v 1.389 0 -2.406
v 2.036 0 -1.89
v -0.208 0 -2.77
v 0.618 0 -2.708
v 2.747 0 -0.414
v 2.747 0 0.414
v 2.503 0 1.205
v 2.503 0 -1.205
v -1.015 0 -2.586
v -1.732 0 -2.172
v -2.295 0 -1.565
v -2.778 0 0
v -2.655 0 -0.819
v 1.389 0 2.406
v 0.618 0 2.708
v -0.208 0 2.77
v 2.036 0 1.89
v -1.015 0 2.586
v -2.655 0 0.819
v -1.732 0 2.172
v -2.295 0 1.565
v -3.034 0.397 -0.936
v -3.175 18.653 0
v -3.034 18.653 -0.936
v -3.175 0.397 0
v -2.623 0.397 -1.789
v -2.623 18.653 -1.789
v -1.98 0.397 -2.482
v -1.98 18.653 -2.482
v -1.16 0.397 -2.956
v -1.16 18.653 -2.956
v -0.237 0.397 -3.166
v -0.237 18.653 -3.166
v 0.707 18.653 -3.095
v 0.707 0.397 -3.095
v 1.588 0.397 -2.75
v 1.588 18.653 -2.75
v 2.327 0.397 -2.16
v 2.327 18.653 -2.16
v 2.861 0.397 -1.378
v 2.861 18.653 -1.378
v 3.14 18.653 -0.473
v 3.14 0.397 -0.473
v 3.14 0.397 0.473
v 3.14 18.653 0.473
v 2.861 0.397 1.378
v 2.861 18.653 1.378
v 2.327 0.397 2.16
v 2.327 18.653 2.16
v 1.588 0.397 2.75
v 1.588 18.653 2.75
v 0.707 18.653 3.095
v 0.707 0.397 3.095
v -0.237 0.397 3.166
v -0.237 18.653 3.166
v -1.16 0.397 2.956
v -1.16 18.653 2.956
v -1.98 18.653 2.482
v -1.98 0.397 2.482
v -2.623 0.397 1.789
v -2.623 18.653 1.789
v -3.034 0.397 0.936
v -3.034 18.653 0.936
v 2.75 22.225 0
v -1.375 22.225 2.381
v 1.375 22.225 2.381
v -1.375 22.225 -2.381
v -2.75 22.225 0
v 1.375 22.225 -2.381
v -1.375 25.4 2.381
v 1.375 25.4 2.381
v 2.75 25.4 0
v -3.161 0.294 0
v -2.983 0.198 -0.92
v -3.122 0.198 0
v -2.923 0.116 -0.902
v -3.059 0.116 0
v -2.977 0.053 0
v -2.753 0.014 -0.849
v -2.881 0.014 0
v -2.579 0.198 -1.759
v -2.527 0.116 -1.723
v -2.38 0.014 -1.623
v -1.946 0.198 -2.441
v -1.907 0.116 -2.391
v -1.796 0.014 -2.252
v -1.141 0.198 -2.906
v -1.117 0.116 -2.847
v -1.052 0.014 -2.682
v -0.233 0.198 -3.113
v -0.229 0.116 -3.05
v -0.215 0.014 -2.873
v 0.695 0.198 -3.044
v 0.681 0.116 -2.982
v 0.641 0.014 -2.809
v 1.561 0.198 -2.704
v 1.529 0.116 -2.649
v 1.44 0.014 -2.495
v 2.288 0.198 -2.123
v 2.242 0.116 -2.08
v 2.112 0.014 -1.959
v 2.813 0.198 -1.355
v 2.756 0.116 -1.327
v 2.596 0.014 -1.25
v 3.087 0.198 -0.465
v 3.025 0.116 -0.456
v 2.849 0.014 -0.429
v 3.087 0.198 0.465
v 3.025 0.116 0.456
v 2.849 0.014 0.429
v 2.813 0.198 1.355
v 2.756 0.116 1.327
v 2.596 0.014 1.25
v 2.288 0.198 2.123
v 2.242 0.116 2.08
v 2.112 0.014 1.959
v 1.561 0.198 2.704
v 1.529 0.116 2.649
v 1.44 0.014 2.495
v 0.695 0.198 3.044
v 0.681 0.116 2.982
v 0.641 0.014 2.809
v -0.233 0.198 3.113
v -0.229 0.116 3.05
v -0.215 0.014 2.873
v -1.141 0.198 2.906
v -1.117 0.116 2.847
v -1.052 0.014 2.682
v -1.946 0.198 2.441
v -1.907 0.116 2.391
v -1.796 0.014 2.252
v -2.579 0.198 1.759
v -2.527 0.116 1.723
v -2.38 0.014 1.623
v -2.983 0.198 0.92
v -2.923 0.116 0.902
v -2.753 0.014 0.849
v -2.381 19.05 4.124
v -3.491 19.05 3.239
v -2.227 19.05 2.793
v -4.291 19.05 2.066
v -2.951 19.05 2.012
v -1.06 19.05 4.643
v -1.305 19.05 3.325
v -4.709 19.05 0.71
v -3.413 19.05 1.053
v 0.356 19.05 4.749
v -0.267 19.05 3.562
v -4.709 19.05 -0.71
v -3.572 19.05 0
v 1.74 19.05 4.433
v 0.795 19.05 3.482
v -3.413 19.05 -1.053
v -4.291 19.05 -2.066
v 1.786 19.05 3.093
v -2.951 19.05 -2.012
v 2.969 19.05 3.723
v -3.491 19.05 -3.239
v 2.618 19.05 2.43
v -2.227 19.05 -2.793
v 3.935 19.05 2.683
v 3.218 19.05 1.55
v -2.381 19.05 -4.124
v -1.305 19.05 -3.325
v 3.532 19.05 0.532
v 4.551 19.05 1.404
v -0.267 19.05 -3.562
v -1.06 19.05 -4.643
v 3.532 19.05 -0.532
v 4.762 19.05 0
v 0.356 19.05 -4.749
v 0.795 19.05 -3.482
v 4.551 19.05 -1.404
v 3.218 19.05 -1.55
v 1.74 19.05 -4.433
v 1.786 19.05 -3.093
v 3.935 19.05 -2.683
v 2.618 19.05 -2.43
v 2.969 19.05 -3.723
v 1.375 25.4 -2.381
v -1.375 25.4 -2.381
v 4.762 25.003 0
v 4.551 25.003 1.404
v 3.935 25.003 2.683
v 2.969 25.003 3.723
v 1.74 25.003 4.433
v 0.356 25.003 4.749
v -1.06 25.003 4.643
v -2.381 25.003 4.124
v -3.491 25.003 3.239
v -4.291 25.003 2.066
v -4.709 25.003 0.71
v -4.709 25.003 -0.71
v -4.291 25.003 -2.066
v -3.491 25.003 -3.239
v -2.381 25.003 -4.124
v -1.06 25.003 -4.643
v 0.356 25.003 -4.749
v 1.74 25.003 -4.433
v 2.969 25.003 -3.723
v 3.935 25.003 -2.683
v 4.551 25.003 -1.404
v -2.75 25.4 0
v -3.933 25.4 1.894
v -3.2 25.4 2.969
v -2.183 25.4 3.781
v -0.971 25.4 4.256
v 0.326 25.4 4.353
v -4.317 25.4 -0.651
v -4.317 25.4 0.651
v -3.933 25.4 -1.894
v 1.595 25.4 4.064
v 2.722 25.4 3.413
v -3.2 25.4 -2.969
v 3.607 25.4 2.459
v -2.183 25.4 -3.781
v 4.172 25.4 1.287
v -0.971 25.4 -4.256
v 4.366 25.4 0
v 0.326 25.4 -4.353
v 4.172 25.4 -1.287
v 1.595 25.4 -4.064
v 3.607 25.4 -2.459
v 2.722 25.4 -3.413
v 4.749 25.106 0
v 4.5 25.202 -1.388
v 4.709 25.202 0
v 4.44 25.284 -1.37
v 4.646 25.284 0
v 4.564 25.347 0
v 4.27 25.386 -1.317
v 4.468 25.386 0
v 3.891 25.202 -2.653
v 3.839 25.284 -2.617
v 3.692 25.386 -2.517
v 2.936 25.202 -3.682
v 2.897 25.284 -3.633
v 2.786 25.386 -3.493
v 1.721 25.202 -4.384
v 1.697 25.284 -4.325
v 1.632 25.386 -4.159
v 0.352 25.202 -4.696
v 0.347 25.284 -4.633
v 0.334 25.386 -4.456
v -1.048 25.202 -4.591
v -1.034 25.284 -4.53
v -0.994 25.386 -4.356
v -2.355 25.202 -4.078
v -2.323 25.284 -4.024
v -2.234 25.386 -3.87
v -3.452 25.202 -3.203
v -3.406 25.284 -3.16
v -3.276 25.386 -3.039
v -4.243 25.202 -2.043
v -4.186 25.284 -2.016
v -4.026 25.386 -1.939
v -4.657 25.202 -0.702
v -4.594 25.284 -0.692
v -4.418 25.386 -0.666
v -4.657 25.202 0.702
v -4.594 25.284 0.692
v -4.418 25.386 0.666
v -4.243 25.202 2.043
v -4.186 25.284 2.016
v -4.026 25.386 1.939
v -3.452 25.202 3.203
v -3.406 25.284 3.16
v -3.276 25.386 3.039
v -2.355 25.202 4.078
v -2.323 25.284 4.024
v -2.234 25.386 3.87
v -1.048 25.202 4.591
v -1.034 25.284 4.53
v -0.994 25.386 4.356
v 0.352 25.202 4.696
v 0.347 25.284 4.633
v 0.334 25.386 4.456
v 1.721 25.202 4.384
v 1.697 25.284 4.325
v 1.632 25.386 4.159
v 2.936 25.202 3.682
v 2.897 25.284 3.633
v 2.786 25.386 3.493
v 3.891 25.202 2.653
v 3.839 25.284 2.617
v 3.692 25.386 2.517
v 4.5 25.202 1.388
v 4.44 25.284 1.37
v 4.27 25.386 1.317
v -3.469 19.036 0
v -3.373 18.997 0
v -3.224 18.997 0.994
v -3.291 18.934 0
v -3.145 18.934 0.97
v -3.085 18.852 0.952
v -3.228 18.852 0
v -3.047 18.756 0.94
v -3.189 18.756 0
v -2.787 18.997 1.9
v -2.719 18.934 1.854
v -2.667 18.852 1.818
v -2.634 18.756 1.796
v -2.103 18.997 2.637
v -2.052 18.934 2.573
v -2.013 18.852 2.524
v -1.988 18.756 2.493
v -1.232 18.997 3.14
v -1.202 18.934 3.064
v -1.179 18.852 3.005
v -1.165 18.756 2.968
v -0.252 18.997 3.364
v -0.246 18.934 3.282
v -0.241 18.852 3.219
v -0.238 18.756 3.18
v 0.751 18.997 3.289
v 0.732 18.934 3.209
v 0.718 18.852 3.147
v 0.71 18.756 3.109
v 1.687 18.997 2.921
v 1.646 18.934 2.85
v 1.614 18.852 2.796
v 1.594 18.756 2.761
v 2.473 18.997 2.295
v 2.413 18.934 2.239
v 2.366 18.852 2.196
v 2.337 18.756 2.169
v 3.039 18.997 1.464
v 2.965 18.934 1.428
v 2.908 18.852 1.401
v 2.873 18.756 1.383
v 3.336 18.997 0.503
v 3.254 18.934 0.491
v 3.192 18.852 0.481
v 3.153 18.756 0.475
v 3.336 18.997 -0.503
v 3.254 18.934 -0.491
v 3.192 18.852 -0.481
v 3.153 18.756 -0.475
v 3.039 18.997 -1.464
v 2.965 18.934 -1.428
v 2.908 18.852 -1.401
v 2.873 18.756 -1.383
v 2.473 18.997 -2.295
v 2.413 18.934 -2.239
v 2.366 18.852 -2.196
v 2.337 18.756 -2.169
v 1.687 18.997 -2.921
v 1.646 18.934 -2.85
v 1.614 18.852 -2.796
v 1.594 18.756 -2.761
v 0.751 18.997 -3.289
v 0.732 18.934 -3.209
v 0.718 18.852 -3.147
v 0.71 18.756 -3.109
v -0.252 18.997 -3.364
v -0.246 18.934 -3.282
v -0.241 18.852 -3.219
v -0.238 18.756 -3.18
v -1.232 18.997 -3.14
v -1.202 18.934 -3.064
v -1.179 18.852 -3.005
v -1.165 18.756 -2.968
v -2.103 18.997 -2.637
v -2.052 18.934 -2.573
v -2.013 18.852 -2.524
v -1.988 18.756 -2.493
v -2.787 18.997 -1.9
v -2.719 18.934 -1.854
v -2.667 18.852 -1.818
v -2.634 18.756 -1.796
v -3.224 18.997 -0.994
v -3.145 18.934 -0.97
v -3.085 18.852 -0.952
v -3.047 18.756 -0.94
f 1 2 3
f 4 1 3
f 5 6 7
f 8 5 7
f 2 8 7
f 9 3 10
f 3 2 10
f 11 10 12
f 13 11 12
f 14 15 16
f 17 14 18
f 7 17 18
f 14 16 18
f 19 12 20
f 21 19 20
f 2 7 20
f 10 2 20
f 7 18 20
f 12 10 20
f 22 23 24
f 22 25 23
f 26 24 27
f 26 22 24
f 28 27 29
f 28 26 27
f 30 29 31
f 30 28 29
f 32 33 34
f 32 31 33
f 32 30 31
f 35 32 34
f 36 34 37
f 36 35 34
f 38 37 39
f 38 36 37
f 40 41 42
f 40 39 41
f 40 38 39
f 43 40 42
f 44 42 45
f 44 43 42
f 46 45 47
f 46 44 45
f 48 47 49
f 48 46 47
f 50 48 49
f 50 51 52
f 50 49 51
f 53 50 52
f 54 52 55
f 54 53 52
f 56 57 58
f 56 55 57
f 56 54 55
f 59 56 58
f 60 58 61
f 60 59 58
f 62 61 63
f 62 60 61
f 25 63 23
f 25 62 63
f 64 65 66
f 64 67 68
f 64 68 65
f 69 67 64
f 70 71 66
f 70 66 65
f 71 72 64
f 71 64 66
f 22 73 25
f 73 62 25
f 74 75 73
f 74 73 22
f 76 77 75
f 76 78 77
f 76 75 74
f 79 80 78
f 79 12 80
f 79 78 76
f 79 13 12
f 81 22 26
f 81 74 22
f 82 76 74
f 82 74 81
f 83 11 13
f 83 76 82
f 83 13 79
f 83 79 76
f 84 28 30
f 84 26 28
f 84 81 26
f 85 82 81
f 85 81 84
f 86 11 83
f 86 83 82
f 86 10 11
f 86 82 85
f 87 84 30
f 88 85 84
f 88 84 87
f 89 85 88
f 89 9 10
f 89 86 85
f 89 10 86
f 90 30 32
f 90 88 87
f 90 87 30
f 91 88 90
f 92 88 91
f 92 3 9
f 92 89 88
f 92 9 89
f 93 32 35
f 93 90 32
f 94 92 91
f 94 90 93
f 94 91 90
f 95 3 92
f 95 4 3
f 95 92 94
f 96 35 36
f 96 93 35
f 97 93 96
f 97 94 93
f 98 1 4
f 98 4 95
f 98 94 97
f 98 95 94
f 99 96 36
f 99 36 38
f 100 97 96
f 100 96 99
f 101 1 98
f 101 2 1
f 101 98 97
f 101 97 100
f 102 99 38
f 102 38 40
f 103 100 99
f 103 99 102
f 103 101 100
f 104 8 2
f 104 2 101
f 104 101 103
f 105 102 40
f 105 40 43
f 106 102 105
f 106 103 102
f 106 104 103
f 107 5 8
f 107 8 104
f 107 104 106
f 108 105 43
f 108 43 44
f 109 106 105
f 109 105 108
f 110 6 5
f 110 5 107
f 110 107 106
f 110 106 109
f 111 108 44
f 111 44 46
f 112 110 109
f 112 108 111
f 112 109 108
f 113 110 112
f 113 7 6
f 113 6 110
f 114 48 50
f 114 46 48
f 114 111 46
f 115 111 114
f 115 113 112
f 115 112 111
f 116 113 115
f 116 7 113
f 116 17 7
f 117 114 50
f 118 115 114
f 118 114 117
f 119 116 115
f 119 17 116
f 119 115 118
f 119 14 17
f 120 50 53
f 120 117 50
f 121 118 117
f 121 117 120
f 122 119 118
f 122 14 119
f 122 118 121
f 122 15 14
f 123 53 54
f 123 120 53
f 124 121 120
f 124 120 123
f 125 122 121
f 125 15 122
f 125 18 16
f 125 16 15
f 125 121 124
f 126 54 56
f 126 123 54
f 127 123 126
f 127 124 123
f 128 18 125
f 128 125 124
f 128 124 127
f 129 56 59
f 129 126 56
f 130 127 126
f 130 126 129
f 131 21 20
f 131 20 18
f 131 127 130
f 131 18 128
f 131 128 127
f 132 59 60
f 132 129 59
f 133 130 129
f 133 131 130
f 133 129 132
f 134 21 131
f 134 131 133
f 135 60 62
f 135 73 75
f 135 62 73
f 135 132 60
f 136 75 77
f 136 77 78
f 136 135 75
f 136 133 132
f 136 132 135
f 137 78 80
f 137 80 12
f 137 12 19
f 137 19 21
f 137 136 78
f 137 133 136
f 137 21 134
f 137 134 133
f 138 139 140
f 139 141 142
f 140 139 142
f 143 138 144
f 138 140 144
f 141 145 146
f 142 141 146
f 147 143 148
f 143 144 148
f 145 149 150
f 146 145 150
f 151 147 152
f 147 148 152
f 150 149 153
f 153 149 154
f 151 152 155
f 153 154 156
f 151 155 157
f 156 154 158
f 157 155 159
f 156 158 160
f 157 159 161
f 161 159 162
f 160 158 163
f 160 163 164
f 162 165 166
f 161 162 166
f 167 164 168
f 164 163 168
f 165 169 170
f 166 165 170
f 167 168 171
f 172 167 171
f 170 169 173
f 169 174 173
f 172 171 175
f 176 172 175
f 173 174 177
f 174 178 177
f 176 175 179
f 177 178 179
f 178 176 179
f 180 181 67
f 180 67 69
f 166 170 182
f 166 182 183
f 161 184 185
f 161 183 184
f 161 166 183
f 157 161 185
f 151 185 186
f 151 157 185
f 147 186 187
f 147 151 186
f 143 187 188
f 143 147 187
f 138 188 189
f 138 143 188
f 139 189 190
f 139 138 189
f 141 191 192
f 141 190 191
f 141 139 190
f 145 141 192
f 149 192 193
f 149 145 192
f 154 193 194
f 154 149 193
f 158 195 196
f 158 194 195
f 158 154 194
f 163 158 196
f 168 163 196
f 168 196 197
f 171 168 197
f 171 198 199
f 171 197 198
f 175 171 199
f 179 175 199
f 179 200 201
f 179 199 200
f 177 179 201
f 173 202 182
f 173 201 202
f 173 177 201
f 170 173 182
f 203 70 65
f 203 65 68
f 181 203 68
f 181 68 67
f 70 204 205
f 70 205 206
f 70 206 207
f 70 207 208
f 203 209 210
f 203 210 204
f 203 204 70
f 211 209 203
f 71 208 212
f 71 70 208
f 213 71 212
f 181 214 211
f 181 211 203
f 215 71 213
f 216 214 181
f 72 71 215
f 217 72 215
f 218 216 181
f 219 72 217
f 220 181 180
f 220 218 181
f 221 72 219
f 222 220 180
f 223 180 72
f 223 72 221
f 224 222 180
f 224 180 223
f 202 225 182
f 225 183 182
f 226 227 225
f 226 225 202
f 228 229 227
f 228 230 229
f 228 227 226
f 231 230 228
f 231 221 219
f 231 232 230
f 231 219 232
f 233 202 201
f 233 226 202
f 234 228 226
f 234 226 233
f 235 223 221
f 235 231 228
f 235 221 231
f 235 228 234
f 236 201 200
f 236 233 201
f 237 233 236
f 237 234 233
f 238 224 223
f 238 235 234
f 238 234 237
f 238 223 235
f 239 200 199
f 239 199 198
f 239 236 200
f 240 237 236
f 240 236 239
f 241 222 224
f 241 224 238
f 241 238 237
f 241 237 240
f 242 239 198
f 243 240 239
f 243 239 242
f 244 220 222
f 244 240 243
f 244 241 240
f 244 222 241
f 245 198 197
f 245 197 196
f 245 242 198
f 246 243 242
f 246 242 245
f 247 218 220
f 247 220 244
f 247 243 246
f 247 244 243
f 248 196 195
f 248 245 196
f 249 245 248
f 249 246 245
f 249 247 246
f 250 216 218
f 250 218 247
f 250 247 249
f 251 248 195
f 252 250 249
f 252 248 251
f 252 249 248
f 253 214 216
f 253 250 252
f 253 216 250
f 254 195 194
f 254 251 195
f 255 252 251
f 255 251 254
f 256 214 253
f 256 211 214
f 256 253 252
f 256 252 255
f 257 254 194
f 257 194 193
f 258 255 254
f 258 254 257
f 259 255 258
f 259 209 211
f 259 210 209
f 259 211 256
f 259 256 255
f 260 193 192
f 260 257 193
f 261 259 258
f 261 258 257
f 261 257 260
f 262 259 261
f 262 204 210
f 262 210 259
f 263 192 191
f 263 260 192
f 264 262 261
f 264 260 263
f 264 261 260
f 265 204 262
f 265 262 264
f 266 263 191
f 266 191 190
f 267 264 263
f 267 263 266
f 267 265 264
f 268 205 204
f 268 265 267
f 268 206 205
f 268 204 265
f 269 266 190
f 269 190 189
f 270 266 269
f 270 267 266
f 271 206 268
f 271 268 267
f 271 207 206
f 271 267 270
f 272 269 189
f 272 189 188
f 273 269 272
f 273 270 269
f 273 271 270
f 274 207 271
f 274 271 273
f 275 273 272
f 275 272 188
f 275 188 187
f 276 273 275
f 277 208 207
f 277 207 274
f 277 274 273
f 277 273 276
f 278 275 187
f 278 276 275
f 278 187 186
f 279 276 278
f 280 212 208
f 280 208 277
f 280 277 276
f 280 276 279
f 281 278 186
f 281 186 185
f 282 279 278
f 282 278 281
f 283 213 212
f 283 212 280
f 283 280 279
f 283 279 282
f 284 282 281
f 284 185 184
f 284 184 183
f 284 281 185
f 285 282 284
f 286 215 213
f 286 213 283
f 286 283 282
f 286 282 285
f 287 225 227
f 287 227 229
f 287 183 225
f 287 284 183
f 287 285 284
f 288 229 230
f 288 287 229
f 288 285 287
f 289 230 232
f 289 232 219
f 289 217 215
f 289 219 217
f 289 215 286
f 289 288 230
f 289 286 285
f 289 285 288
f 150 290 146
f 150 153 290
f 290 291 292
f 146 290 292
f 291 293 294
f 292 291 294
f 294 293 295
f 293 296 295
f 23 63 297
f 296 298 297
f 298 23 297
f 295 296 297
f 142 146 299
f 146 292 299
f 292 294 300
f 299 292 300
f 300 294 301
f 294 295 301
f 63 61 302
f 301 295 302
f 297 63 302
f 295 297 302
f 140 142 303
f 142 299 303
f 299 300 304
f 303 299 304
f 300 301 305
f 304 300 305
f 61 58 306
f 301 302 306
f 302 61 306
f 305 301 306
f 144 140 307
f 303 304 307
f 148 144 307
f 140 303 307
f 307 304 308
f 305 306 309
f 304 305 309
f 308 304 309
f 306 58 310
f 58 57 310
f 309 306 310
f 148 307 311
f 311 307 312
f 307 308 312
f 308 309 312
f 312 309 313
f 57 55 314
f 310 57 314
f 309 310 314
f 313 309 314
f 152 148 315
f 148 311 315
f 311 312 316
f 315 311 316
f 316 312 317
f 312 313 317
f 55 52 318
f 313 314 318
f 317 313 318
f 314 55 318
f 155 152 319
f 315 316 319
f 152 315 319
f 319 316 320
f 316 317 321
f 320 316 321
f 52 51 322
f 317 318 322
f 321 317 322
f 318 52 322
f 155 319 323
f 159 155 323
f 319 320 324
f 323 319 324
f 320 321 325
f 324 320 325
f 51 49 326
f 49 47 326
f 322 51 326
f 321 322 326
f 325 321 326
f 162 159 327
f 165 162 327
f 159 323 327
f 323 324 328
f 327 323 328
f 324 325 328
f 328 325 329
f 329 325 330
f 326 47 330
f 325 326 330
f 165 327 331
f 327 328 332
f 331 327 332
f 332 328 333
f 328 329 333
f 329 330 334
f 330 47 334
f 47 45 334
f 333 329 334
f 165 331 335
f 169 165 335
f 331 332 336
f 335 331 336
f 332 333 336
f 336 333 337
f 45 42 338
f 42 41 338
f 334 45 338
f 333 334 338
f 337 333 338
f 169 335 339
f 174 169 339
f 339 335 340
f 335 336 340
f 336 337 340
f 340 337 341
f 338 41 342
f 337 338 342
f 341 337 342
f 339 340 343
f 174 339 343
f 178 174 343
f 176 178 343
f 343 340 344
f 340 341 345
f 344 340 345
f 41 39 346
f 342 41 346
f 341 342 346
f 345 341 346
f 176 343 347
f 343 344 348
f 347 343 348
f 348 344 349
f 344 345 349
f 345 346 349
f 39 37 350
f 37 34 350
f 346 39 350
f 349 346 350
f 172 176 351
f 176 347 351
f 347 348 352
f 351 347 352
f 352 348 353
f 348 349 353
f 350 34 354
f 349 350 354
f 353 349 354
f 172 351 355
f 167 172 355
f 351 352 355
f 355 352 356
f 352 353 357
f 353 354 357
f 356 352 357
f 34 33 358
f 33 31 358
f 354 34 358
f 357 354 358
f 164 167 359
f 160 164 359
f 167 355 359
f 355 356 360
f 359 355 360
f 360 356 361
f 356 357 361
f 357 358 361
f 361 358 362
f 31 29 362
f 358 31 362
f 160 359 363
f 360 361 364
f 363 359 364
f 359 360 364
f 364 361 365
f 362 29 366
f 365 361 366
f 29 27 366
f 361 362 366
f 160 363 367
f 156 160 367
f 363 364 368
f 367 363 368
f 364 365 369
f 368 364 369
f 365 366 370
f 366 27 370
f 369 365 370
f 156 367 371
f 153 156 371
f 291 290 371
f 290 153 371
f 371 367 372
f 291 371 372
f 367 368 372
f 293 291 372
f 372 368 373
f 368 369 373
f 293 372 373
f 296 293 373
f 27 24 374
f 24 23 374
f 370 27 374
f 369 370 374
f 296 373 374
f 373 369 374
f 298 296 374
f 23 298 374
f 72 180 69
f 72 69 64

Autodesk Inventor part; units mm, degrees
ref_plane "YZ Plane" through (0, 0, 0) normal (1, 0, 0) x (0, 1, 0)
ref_plane "XZ Plane" through (0, 0, 0) normal (0, 1, 0) x (-1, 0, 0)
ref_plane "XY Plane" through (0, 0, 0) normal (0, 0, 1) x (1, 0, 0)
sketch "Sketch1" plane through (0, 0, 0) normal (0, 1, 0) x (-1, 0, 0)
  circle A0 centre (0, 0) radius 3.175
  dimension "d0" = 6.35
extrude "Extrusion1" add sketch "Sketch1" along normal blind 19.05
sketch "Sketch2" plane through (0, 19.05, 0) normal (0, 1, 0) x (1, 0, 0)
  circle A0 centre (0, 0) radius 3.175 projected
  circle A1 centre (0, 0) radius 4.7625
  dimension "d3" = 9.525
extrude "Extrusion2" add sketch "Sketch2" along normal blind 6.35 contours A0 | A1
sketch "Sketch3" plane through (0, 25.4, 0) normal (0, 1, 0) x (1, 0, 0)
  circle A0 centre (0, 0) radius 4.7625 projected
  line L0 (-1.3748, 2.3812) -> (1.3748, 2.3813)
  line L1 (1.3748, 2.3813) -> (2.7496, 0)
  line L2 (2.7496, 0) -> (1.3748, -2.3813)
  line L3 (1.3748, -2.3813) -> (-1.3748, -2.3813)
  line L4 (-1.3748, -2.3813) -> (-2.7496, 0)
  line L5 (-2.7496, 0) -> (-1.3748, 2.3812)
  dimension "d6" = 4.7625
extrude "Extrusion3" cut sketch "Sketch3" against normal blind 3.175 contours L0 L1 L2 L3 L4 L5
fillet "Fillet1" radius 0.3969 3 edges at (3.175, 19.05, 0) (-4.7625, 25.4, 0) (3.175, 0, 0)
properties part number "Bolt_0.25_20_0.75len_SocketHead" material "Stainless Steel, Austenitic"
